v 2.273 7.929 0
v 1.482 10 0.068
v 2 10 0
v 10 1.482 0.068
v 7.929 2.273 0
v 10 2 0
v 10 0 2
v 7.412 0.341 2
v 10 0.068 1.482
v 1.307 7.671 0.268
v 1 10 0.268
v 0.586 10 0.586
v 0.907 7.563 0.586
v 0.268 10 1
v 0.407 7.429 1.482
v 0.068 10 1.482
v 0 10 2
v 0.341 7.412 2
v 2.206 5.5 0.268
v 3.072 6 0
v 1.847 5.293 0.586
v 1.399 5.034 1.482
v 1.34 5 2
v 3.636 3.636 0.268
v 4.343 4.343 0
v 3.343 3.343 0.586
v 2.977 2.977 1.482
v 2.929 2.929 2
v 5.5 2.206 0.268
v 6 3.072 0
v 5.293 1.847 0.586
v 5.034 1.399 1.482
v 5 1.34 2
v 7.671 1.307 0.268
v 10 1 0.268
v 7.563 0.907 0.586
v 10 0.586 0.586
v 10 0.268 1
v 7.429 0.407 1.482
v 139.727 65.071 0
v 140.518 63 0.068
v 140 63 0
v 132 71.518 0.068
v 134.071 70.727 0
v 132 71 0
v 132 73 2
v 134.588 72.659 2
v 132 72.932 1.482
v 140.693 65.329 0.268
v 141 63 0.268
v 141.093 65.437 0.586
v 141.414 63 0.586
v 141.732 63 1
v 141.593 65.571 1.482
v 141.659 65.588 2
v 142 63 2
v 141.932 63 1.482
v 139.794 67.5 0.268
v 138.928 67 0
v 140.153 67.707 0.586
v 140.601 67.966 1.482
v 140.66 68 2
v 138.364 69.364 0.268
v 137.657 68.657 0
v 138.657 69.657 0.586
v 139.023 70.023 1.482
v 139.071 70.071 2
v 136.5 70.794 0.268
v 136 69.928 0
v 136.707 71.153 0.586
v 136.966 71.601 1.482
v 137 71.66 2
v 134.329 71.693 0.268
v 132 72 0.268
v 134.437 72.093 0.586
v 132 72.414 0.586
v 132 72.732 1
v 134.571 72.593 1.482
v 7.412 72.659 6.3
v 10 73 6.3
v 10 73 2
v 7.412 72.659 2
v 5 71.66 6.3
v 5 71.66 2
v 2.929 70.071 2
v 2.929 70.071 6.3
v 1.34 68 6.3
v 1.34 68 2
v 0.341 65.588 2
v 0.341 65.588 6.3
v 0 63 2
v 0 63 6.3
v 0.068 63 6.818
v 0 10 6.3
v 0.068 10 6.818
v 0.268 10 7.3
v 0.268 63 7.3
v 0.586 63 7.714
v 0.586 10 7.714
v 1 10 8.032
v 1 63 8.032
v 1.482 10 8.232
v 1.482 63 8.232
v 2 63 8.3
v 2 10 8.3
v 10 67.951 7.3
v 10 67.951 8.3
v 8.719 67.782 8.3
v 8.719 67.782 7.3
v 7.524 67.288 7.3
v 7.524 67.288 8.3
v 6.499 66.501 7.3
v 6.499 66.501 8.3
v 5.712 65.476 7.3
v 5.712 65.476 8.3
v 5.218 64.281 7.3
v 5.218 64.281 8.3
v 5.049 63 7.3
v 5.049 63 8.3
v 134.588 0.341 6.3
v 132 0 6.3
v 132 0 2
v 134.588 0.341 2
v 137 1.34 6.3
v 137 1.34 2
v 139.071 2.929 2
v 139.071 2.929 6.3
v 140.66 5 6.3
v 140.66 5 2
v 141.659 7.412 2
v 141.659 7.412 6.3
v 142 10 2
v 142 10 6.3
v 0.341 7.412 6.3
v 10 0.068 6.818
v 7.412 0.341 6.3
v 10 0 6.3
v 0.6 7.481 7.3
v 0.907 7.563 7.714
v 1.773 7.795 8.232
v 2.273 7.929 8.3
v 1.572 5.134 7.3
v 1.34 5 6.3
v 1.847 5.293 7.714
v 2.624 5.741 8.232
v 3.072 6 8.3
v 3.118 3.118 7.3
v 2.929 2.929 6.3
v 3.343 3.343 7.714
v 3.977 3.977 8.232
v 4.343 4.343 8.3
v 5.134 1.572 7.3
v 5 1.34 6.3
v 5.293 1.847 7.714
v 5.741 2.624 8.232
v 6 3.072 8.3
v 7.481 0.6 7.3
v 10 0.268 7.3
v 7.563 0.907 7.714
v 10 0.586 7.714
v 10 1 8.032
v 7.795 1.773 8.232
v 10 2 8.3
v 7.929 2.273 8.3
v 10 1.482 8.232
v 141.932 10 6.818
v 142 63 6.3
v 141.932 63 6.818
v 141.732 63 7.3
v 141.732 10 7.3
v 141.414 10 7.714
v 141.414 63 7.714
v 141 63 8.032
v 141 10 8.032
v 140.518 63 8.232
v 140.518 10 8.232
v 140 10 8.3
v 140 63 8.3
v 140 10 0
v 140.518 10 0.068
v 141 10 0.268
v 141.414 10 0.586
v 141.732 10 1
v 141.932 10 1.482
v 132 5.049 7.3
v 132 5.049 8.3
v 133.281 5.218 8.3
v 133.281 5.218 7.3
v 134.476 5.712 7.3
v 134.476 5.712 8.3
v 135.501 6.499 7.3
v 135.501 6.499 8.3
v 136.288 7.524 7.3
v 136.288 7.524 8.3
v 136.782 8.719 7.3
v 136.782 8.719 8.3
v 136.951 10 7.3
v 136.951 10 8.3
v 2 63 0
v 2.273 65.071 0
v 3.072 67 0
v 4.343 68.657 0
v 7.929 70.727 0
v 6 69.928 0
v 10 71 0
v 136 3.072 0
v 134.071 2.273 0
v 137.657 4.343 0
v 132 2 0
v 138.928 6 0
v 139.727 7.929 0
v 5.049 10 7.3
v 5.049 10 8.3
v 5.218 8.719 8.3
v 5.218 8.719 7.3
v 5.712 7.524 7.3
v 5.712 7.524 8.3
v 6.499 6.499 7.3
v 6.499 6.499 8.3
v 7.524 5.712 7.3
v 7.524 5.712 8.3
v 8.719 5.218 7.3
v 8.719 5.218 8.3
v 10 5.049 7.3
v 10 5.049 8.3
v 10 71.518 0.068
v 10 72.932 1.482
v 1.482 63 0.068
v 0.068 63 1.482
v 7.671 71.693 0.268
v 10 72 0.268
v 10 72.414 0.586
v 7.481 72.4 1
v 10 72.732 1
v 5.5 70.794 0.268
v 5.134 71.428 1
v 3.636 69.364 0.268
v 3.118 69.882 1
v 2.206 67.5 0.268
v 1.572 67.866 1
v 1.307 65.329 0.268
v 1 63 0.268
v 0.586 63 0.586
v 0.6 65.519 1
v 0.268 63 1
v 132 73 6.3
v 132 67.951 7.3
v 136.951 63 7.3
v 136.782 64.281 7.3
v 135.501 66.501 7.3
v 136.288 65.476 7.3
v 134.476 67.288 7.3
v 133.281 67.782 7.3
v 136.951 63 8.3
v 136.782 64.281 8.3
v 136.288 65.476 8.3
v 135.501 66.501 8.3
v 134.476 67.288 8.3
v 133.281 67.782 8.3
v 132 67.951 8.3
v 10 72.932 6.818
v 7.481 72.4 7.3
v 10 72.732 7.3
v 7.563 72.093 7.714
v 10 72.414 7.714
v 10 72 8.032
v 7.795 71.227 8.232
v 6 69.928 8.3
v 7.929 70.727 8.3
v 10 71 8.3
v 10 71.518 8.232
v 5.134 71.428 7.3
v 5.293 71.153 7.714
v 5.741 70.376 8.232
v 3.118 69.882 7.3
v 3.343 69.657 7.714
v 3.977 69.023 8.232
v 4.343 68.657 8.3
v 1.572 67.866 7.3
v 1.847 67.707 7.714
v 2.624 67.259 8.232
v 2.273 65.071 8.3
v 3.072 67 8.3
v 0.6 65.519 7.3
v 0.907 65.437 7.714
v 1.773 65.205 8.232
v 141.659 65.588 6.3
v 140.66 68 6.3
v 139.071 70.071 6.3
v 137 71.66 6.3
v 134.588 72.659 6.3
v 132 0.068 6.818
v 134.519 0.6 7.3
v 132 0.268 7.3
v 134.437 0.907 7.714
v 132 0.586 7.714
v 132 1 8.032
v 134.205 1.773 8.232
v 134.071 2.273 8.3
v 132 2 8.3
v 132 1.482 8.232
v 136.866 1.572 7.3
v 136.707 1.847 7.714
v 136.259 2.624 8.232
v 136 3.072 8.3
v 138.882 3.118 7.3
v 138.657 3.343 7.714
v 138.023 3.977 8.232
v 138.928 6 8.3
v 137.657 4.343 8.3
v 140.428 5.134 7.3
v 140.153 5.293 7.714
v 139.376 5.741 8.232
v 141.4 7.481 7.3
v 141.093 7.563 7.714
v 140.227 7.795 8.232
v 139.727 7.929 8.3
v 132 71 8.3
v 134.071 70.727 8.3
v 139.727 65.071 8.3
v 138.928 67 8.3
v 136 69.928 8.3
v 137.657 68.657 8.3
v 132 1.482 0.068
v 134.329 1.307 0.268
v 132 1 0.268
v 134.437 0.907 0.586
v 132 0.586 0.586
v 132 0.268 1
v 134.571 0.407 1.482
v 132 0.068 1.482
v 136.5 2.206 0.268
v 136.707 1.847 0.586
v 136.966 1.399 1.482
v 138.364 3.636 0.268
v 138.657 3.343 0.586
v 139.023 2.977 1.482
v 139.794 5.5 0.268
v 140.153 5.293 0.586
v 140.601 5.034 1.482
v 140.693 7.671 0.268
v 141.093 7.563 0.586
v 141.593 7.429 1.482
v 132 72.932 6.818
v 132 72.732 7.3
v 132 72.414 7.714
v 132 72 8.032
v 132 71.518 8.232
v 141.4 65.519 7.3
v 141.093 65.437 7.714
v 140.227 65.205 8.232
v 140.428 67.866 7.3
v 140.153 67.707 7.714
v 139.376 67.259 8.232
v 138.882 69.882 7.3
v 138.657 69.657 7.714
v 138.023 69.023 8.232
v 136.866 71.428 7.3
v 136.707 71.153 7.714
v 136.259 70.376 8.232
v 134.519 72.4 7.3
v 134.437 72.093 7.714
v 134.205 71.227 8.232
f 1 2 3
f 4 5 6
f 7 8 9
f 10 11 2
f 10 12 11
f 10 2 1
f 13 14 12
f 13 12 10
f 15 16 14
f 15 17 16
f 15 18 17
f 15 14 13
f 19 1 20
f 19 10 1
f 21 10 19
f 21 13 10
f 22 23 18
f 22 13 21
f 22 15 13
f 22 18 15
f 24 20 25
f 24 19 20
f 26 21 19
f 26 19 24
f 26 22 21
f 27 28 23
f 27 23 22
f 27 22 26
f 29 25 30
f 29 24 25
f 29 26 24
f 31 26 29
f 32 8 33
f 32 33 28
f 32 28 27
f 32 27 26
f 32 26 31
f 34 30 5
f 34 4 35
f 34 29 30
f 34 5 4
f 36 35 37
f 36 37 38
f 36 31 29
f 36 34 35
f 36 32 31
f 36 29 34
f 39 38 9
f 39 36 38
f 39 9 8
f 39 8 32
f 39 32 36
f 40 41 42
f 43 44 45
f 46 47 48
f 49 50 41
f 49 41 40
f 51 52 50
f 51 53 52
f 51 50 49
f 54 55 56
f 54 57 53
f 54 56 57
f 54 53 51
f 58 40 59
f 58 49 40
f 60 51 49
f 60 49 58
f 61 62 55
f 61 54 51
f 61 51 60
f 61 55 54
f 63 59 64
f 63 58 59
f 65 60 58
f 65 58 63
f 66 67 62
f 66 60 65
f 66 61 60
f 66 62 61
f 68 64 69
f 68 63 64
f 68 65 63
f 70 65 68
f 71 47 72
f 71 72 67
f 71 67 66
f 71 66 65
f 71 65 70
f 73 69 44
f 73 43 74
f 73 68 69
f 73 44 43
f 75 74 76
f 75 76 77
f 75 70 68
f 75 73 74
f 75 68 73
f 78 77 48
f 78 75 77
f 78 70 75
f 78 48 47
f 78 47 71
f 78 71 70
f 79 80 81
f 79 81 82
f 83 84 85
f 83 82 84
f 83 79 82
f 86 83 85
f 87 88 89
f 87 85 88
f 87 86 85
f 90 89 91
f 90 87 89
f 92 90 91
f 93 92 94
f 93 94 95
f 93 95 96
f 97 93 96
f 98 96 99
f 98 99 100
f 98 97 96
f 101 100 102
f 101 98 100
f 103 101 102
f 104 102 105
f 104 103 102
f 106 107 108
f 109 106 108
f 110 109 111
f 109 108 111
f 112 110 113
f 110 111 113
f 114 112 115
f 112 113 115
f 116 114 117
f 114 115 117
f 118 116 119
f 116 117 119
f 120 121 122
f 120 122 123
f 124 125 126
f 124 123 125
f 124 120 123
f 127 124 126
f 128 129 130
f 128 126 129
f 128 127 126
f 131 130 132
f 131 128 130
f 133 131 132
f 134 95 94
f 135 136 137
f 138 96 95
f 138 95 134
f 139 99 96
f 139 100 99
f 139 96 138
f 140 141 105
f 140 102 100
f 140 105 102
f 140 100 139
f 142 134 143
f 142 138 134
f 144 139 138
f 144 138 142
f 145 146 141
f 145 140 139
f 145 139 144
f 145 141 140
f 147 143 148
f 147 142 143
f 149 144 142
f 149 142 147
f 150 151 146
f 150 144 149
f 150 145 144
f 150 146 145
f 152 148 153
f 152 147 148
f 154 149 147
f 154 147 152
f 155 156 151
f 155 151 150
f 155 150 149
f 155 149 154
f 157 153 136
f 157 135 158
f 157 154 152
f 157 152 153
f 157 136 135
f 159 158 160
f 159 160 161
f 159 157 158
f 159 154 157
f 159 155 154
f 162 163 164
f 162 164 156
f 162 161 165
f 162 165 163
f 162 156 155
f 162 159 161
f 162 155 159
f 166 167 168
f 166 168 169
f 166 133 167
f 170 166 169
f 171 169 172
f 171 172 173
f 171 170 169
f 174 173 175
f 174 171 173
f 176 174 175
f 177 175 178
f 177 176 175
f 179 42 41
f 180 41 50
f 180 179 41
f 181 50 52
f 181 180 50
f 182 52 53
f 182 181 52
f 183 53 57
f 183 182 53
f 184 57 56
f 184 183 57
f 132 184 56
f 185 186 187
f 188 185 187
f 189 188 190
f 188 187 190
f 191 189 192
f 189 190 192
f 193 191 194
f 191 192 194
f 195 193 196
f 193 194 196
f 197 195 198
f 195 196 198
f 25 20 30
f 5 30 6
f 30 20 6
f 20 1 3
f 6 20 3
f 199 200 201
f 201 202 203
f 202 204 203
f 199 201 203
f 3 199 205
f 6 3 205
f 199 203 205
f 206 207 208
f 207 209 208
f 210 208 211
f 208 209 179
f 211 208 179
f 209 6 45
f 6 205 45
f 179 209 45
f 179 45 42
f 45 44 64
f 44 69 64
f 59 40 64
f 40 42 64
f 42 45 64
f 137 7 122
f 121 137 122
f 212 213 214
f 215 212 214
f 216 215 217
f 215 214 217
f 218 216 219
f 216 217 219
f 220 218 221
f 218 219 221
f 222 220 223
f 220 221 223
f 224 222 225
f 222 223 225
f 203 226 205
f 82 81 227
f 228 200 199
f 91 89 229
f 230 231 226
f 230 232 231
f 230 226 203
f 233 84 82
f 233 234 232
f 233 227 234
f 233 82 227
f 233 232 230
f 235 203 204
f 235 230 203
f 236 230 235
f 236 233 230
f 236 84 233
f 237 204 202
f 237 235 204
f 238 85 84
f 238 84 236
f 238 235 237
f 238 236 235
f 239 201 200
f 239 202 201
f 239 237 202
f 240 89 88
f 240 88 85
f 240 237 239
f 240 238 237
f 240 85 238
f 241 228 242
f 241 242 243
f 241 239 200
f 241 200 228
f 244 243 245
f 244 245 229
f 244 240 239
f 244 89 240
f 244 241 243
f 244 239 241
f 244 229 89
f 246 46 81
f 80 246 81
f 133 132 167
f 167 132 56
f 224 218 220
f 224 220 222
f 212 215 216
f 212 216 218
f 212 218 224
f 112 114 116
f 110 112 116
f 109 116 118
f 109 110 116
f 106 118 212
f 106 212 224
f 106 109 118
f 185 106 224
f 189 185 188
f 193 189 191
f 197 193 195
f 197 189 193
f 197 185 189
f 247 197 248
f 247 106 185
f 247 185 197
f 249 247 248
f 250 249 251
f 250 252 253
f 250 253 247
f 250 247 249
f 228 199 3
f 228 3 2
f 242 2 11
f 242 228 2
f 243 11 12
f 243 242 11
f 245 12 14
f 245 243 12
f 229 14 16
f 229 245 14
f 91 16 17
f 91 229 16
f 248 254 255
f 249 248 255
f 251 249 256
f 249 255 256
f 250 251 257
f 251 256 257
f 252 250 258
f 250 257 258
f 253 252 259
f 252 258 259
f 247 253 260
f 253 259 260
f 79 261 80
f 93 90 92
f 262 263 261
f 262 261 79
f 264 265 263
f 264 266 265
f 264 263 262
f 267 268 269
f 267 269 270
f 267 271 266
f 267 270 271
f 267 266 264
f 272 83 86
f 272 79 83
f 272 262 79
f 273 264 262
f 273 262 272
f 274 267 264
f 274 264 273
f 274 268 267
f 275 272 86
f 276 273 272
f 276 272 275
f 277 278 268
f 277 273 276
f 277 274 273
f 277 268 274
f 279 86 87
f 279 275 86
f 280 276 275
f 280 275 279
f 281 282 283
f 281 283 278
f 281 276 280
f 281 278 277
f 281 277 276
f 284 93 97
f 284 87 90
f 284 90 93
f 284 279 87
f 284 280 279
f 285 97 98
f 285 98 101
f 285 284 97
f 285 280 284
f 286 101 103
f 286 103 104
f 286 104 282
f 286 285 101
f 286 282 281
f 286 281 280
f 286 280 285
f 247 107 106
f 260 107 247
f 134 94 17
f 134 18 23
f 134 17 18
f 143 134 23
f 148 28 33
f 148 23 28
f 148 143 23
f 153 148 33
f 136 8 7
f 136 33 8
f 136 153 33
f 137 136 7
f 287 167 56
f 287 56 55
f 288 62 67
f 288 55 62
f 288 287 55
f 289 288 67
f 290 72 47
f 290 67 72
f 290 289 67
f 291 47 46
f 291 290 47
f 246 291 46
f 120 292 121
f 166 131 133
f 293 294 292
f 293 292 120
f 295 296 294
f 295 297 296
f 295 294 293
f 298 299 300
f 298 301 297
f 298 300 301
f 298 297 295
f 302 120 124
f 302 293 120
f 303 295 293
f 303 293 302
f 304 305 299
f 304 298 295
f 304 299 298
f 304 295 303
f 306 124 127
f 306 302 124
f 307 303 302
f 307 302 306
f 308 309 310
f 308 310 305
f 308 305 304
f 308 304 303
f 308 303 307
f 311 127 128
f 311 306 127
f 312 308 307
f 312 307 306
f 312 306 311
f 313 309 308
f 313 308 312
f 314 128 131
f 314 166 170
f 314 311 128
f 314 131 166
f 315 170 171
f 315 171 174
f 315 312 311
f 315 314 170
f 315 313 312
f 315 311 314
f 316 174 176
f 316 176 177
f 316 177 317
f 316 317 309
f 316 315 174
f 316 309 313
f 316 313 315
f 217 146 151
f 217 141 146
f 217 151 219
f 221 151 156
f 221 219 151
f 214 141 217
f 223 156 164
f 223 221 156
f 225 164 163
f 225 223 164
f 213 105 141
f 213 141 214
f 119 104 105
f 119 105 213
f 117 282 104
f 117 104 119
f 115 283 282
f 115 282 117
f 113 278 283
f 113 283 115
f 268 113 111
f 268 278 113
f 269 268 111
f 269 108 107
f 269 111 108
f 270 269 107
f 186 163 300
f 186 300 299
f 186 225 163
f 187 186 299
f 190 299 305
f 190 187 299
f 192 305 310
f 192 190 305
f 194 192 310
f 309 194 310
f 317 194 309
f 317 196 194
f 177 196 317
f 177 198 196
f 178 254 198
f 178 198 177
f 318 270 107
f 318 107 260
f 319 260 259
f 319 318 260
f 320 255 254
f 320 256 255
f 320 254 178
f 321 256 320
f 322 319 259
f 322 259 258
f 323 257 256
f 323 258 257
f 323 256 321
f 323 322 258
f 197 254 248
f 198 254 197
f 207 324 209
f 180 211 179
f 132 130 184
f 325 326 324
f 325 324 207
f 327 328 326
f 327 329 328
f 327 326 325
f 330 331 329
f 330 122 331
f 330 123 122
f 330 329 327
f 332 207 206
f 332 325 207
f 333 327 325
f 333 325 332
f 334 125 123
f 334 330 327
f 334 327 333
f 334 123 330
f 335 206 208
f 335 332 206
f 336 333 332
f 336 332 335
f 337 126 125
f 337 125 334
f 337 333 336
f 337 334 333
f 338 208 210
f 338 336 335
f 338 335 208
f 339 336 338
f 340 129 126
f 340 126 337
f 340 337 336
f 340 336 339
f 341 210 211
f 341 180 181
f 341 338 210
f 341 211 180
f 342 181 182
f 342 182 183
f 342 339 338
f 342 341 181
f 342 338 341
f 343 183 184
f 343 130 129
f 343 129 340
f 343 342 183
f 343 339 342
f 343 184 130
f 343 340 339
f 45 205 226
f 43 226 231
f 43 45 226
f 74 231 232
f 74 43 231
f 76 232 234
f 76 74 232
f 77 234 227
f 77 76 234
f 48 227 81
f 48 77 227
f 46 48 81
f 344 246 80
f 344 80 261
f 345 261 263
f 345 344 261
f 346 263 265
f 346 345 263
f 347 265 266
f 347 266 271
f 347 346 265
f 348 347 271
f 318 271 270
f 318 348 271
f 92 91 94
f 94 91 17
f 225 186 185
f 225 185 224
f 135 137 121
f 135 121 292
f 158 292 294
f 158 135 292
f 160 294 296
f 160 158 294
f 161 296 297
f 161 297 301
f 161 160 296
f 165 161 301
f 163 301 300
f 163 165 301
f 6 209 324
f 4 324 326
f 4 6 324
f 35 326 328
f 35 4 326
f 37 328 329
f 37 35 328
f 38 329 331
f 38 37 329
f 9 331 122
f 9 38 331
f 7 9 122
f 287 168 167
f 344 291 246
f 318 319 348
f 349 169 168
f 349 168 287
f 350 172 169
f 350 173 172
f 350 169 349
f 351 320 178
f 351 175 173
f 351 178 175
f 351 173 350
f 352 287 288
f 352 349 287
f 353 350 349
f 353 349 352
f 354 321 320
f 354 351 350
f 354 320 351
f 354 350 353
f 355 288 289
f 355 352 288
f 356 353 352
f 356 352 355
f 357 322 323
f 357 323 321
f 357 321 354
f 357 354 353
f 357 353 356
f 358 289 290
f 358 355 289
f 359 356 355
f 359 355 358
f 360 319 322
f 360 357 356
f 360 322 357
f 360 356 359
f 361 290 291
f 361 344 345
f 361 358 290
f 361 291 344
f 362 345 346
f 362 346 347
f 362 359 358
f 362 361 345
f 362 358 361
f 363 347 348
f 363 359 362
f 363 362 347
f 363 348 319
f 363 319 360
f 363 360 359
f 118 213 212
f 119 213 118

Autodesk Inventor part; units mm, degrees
ref_plane "YZ Plane" through (0, 0, 0) normal (1, 0, 0) x (0, 1, 0)
ref_plane "XZ Plane" through (0, 0, 0) normal (0, 1, 0) x (-1, 0, 0)
ref_plane "XY Plane" through (0, 0, 0) normal (0, 0, 1) x (1, 0, 0)
sketch "Sketch1" plane through (0, 0, 0) normal (0, 0, 1) x (1, 0, 0)
  line L0 (0, 0) -> (142, 0)
  line L1 (142, 0) -> (142, 73)
  line L2 (142, 73) -> (0, 73)
  line L3 (0, 73) -> (0, 0)
  dimension "d0" = 142
  dimension "d1" = 73
extrude "Extrusion1" add sketch "Sketch1" along normal blind 8.3
fillet "Fillet1" radius 10 4 edges at (142, 73, 4.15) (142, 0, 4.15) (0, 0, 4.15) (0, 73, 4.15)
fillet "Fillet2" radius 2 16 edges at (2.9289, 70.0711, 8.3) (0, 36.5, 8.3) (2.9289, 2.9289, 8.3) (71, 0, 8.3) (139.0711, 2.9289, 8.3) (142, 36.5, 8.3) (139.0711, 70.0711, 8.3) (71, 73, 8.3) (2.9289, 70.0711, 0) (0, 36.5, 0) (2.9289, 2.9289, 0) (71, 0, 0) (139.0711, 2.9289, 0) (142, 36.5, 0) (139.0711, 70.0711, 0) (71, 73, 0)
sketch "Sketch2" plane through (0, 0, 8.3) normal (0, 0, 1) x (1, 0, 0)
  arc A0 (10, 71) -> (2, 63) centre (10, 63) ccw projected
  line L0 (2, 10) -> (2, 63) projected
  arc A1 (2, 10) -> (10, 2) centre (10, 10) ccw projected
  line L1 (132, 2) -> (10, 2) projected
  arc A2 (132, 2) -> (140, 10) centre (132, 10) ccw projected
  line L2 (140, 63) -> (140, 10) projected
  arc A3 (140, 63) -> (132, 71) centre (132, 63) ccw projected
  line L3 (10, 71) -> (132, 71) projected
  arc A4 (136.9512, 63) -> (132, 67.9512) centre (132, 63) ccw
  line L4 (136.9512, 63) -> (136.9512, 10)
  arc A5 (132, 5.0488) -> (136.9512, 10) centre (132, 10) ccw
  line L5 (132, 5.0488) -> (10, 5.0488)
  arc A6 (5.0488, 10) -> (10, 5.0488) centre (10, 10) ccw
  line L6 (5.0488, 10) -> (5.0488, 63)
  arc A7 (10, 67.9512) -> (5.0488, 63) centre (10, 63) ccw
  line L7 (10, 67.9512) -> (132, 67.9512)
  point P0 (0, 0)
extrude "Extrusion2" cut sketch "Sketch2" against normal blind 1 contours L4 A5 L5 A6 L6 A7 L7 A4
properties part number "Phone"
